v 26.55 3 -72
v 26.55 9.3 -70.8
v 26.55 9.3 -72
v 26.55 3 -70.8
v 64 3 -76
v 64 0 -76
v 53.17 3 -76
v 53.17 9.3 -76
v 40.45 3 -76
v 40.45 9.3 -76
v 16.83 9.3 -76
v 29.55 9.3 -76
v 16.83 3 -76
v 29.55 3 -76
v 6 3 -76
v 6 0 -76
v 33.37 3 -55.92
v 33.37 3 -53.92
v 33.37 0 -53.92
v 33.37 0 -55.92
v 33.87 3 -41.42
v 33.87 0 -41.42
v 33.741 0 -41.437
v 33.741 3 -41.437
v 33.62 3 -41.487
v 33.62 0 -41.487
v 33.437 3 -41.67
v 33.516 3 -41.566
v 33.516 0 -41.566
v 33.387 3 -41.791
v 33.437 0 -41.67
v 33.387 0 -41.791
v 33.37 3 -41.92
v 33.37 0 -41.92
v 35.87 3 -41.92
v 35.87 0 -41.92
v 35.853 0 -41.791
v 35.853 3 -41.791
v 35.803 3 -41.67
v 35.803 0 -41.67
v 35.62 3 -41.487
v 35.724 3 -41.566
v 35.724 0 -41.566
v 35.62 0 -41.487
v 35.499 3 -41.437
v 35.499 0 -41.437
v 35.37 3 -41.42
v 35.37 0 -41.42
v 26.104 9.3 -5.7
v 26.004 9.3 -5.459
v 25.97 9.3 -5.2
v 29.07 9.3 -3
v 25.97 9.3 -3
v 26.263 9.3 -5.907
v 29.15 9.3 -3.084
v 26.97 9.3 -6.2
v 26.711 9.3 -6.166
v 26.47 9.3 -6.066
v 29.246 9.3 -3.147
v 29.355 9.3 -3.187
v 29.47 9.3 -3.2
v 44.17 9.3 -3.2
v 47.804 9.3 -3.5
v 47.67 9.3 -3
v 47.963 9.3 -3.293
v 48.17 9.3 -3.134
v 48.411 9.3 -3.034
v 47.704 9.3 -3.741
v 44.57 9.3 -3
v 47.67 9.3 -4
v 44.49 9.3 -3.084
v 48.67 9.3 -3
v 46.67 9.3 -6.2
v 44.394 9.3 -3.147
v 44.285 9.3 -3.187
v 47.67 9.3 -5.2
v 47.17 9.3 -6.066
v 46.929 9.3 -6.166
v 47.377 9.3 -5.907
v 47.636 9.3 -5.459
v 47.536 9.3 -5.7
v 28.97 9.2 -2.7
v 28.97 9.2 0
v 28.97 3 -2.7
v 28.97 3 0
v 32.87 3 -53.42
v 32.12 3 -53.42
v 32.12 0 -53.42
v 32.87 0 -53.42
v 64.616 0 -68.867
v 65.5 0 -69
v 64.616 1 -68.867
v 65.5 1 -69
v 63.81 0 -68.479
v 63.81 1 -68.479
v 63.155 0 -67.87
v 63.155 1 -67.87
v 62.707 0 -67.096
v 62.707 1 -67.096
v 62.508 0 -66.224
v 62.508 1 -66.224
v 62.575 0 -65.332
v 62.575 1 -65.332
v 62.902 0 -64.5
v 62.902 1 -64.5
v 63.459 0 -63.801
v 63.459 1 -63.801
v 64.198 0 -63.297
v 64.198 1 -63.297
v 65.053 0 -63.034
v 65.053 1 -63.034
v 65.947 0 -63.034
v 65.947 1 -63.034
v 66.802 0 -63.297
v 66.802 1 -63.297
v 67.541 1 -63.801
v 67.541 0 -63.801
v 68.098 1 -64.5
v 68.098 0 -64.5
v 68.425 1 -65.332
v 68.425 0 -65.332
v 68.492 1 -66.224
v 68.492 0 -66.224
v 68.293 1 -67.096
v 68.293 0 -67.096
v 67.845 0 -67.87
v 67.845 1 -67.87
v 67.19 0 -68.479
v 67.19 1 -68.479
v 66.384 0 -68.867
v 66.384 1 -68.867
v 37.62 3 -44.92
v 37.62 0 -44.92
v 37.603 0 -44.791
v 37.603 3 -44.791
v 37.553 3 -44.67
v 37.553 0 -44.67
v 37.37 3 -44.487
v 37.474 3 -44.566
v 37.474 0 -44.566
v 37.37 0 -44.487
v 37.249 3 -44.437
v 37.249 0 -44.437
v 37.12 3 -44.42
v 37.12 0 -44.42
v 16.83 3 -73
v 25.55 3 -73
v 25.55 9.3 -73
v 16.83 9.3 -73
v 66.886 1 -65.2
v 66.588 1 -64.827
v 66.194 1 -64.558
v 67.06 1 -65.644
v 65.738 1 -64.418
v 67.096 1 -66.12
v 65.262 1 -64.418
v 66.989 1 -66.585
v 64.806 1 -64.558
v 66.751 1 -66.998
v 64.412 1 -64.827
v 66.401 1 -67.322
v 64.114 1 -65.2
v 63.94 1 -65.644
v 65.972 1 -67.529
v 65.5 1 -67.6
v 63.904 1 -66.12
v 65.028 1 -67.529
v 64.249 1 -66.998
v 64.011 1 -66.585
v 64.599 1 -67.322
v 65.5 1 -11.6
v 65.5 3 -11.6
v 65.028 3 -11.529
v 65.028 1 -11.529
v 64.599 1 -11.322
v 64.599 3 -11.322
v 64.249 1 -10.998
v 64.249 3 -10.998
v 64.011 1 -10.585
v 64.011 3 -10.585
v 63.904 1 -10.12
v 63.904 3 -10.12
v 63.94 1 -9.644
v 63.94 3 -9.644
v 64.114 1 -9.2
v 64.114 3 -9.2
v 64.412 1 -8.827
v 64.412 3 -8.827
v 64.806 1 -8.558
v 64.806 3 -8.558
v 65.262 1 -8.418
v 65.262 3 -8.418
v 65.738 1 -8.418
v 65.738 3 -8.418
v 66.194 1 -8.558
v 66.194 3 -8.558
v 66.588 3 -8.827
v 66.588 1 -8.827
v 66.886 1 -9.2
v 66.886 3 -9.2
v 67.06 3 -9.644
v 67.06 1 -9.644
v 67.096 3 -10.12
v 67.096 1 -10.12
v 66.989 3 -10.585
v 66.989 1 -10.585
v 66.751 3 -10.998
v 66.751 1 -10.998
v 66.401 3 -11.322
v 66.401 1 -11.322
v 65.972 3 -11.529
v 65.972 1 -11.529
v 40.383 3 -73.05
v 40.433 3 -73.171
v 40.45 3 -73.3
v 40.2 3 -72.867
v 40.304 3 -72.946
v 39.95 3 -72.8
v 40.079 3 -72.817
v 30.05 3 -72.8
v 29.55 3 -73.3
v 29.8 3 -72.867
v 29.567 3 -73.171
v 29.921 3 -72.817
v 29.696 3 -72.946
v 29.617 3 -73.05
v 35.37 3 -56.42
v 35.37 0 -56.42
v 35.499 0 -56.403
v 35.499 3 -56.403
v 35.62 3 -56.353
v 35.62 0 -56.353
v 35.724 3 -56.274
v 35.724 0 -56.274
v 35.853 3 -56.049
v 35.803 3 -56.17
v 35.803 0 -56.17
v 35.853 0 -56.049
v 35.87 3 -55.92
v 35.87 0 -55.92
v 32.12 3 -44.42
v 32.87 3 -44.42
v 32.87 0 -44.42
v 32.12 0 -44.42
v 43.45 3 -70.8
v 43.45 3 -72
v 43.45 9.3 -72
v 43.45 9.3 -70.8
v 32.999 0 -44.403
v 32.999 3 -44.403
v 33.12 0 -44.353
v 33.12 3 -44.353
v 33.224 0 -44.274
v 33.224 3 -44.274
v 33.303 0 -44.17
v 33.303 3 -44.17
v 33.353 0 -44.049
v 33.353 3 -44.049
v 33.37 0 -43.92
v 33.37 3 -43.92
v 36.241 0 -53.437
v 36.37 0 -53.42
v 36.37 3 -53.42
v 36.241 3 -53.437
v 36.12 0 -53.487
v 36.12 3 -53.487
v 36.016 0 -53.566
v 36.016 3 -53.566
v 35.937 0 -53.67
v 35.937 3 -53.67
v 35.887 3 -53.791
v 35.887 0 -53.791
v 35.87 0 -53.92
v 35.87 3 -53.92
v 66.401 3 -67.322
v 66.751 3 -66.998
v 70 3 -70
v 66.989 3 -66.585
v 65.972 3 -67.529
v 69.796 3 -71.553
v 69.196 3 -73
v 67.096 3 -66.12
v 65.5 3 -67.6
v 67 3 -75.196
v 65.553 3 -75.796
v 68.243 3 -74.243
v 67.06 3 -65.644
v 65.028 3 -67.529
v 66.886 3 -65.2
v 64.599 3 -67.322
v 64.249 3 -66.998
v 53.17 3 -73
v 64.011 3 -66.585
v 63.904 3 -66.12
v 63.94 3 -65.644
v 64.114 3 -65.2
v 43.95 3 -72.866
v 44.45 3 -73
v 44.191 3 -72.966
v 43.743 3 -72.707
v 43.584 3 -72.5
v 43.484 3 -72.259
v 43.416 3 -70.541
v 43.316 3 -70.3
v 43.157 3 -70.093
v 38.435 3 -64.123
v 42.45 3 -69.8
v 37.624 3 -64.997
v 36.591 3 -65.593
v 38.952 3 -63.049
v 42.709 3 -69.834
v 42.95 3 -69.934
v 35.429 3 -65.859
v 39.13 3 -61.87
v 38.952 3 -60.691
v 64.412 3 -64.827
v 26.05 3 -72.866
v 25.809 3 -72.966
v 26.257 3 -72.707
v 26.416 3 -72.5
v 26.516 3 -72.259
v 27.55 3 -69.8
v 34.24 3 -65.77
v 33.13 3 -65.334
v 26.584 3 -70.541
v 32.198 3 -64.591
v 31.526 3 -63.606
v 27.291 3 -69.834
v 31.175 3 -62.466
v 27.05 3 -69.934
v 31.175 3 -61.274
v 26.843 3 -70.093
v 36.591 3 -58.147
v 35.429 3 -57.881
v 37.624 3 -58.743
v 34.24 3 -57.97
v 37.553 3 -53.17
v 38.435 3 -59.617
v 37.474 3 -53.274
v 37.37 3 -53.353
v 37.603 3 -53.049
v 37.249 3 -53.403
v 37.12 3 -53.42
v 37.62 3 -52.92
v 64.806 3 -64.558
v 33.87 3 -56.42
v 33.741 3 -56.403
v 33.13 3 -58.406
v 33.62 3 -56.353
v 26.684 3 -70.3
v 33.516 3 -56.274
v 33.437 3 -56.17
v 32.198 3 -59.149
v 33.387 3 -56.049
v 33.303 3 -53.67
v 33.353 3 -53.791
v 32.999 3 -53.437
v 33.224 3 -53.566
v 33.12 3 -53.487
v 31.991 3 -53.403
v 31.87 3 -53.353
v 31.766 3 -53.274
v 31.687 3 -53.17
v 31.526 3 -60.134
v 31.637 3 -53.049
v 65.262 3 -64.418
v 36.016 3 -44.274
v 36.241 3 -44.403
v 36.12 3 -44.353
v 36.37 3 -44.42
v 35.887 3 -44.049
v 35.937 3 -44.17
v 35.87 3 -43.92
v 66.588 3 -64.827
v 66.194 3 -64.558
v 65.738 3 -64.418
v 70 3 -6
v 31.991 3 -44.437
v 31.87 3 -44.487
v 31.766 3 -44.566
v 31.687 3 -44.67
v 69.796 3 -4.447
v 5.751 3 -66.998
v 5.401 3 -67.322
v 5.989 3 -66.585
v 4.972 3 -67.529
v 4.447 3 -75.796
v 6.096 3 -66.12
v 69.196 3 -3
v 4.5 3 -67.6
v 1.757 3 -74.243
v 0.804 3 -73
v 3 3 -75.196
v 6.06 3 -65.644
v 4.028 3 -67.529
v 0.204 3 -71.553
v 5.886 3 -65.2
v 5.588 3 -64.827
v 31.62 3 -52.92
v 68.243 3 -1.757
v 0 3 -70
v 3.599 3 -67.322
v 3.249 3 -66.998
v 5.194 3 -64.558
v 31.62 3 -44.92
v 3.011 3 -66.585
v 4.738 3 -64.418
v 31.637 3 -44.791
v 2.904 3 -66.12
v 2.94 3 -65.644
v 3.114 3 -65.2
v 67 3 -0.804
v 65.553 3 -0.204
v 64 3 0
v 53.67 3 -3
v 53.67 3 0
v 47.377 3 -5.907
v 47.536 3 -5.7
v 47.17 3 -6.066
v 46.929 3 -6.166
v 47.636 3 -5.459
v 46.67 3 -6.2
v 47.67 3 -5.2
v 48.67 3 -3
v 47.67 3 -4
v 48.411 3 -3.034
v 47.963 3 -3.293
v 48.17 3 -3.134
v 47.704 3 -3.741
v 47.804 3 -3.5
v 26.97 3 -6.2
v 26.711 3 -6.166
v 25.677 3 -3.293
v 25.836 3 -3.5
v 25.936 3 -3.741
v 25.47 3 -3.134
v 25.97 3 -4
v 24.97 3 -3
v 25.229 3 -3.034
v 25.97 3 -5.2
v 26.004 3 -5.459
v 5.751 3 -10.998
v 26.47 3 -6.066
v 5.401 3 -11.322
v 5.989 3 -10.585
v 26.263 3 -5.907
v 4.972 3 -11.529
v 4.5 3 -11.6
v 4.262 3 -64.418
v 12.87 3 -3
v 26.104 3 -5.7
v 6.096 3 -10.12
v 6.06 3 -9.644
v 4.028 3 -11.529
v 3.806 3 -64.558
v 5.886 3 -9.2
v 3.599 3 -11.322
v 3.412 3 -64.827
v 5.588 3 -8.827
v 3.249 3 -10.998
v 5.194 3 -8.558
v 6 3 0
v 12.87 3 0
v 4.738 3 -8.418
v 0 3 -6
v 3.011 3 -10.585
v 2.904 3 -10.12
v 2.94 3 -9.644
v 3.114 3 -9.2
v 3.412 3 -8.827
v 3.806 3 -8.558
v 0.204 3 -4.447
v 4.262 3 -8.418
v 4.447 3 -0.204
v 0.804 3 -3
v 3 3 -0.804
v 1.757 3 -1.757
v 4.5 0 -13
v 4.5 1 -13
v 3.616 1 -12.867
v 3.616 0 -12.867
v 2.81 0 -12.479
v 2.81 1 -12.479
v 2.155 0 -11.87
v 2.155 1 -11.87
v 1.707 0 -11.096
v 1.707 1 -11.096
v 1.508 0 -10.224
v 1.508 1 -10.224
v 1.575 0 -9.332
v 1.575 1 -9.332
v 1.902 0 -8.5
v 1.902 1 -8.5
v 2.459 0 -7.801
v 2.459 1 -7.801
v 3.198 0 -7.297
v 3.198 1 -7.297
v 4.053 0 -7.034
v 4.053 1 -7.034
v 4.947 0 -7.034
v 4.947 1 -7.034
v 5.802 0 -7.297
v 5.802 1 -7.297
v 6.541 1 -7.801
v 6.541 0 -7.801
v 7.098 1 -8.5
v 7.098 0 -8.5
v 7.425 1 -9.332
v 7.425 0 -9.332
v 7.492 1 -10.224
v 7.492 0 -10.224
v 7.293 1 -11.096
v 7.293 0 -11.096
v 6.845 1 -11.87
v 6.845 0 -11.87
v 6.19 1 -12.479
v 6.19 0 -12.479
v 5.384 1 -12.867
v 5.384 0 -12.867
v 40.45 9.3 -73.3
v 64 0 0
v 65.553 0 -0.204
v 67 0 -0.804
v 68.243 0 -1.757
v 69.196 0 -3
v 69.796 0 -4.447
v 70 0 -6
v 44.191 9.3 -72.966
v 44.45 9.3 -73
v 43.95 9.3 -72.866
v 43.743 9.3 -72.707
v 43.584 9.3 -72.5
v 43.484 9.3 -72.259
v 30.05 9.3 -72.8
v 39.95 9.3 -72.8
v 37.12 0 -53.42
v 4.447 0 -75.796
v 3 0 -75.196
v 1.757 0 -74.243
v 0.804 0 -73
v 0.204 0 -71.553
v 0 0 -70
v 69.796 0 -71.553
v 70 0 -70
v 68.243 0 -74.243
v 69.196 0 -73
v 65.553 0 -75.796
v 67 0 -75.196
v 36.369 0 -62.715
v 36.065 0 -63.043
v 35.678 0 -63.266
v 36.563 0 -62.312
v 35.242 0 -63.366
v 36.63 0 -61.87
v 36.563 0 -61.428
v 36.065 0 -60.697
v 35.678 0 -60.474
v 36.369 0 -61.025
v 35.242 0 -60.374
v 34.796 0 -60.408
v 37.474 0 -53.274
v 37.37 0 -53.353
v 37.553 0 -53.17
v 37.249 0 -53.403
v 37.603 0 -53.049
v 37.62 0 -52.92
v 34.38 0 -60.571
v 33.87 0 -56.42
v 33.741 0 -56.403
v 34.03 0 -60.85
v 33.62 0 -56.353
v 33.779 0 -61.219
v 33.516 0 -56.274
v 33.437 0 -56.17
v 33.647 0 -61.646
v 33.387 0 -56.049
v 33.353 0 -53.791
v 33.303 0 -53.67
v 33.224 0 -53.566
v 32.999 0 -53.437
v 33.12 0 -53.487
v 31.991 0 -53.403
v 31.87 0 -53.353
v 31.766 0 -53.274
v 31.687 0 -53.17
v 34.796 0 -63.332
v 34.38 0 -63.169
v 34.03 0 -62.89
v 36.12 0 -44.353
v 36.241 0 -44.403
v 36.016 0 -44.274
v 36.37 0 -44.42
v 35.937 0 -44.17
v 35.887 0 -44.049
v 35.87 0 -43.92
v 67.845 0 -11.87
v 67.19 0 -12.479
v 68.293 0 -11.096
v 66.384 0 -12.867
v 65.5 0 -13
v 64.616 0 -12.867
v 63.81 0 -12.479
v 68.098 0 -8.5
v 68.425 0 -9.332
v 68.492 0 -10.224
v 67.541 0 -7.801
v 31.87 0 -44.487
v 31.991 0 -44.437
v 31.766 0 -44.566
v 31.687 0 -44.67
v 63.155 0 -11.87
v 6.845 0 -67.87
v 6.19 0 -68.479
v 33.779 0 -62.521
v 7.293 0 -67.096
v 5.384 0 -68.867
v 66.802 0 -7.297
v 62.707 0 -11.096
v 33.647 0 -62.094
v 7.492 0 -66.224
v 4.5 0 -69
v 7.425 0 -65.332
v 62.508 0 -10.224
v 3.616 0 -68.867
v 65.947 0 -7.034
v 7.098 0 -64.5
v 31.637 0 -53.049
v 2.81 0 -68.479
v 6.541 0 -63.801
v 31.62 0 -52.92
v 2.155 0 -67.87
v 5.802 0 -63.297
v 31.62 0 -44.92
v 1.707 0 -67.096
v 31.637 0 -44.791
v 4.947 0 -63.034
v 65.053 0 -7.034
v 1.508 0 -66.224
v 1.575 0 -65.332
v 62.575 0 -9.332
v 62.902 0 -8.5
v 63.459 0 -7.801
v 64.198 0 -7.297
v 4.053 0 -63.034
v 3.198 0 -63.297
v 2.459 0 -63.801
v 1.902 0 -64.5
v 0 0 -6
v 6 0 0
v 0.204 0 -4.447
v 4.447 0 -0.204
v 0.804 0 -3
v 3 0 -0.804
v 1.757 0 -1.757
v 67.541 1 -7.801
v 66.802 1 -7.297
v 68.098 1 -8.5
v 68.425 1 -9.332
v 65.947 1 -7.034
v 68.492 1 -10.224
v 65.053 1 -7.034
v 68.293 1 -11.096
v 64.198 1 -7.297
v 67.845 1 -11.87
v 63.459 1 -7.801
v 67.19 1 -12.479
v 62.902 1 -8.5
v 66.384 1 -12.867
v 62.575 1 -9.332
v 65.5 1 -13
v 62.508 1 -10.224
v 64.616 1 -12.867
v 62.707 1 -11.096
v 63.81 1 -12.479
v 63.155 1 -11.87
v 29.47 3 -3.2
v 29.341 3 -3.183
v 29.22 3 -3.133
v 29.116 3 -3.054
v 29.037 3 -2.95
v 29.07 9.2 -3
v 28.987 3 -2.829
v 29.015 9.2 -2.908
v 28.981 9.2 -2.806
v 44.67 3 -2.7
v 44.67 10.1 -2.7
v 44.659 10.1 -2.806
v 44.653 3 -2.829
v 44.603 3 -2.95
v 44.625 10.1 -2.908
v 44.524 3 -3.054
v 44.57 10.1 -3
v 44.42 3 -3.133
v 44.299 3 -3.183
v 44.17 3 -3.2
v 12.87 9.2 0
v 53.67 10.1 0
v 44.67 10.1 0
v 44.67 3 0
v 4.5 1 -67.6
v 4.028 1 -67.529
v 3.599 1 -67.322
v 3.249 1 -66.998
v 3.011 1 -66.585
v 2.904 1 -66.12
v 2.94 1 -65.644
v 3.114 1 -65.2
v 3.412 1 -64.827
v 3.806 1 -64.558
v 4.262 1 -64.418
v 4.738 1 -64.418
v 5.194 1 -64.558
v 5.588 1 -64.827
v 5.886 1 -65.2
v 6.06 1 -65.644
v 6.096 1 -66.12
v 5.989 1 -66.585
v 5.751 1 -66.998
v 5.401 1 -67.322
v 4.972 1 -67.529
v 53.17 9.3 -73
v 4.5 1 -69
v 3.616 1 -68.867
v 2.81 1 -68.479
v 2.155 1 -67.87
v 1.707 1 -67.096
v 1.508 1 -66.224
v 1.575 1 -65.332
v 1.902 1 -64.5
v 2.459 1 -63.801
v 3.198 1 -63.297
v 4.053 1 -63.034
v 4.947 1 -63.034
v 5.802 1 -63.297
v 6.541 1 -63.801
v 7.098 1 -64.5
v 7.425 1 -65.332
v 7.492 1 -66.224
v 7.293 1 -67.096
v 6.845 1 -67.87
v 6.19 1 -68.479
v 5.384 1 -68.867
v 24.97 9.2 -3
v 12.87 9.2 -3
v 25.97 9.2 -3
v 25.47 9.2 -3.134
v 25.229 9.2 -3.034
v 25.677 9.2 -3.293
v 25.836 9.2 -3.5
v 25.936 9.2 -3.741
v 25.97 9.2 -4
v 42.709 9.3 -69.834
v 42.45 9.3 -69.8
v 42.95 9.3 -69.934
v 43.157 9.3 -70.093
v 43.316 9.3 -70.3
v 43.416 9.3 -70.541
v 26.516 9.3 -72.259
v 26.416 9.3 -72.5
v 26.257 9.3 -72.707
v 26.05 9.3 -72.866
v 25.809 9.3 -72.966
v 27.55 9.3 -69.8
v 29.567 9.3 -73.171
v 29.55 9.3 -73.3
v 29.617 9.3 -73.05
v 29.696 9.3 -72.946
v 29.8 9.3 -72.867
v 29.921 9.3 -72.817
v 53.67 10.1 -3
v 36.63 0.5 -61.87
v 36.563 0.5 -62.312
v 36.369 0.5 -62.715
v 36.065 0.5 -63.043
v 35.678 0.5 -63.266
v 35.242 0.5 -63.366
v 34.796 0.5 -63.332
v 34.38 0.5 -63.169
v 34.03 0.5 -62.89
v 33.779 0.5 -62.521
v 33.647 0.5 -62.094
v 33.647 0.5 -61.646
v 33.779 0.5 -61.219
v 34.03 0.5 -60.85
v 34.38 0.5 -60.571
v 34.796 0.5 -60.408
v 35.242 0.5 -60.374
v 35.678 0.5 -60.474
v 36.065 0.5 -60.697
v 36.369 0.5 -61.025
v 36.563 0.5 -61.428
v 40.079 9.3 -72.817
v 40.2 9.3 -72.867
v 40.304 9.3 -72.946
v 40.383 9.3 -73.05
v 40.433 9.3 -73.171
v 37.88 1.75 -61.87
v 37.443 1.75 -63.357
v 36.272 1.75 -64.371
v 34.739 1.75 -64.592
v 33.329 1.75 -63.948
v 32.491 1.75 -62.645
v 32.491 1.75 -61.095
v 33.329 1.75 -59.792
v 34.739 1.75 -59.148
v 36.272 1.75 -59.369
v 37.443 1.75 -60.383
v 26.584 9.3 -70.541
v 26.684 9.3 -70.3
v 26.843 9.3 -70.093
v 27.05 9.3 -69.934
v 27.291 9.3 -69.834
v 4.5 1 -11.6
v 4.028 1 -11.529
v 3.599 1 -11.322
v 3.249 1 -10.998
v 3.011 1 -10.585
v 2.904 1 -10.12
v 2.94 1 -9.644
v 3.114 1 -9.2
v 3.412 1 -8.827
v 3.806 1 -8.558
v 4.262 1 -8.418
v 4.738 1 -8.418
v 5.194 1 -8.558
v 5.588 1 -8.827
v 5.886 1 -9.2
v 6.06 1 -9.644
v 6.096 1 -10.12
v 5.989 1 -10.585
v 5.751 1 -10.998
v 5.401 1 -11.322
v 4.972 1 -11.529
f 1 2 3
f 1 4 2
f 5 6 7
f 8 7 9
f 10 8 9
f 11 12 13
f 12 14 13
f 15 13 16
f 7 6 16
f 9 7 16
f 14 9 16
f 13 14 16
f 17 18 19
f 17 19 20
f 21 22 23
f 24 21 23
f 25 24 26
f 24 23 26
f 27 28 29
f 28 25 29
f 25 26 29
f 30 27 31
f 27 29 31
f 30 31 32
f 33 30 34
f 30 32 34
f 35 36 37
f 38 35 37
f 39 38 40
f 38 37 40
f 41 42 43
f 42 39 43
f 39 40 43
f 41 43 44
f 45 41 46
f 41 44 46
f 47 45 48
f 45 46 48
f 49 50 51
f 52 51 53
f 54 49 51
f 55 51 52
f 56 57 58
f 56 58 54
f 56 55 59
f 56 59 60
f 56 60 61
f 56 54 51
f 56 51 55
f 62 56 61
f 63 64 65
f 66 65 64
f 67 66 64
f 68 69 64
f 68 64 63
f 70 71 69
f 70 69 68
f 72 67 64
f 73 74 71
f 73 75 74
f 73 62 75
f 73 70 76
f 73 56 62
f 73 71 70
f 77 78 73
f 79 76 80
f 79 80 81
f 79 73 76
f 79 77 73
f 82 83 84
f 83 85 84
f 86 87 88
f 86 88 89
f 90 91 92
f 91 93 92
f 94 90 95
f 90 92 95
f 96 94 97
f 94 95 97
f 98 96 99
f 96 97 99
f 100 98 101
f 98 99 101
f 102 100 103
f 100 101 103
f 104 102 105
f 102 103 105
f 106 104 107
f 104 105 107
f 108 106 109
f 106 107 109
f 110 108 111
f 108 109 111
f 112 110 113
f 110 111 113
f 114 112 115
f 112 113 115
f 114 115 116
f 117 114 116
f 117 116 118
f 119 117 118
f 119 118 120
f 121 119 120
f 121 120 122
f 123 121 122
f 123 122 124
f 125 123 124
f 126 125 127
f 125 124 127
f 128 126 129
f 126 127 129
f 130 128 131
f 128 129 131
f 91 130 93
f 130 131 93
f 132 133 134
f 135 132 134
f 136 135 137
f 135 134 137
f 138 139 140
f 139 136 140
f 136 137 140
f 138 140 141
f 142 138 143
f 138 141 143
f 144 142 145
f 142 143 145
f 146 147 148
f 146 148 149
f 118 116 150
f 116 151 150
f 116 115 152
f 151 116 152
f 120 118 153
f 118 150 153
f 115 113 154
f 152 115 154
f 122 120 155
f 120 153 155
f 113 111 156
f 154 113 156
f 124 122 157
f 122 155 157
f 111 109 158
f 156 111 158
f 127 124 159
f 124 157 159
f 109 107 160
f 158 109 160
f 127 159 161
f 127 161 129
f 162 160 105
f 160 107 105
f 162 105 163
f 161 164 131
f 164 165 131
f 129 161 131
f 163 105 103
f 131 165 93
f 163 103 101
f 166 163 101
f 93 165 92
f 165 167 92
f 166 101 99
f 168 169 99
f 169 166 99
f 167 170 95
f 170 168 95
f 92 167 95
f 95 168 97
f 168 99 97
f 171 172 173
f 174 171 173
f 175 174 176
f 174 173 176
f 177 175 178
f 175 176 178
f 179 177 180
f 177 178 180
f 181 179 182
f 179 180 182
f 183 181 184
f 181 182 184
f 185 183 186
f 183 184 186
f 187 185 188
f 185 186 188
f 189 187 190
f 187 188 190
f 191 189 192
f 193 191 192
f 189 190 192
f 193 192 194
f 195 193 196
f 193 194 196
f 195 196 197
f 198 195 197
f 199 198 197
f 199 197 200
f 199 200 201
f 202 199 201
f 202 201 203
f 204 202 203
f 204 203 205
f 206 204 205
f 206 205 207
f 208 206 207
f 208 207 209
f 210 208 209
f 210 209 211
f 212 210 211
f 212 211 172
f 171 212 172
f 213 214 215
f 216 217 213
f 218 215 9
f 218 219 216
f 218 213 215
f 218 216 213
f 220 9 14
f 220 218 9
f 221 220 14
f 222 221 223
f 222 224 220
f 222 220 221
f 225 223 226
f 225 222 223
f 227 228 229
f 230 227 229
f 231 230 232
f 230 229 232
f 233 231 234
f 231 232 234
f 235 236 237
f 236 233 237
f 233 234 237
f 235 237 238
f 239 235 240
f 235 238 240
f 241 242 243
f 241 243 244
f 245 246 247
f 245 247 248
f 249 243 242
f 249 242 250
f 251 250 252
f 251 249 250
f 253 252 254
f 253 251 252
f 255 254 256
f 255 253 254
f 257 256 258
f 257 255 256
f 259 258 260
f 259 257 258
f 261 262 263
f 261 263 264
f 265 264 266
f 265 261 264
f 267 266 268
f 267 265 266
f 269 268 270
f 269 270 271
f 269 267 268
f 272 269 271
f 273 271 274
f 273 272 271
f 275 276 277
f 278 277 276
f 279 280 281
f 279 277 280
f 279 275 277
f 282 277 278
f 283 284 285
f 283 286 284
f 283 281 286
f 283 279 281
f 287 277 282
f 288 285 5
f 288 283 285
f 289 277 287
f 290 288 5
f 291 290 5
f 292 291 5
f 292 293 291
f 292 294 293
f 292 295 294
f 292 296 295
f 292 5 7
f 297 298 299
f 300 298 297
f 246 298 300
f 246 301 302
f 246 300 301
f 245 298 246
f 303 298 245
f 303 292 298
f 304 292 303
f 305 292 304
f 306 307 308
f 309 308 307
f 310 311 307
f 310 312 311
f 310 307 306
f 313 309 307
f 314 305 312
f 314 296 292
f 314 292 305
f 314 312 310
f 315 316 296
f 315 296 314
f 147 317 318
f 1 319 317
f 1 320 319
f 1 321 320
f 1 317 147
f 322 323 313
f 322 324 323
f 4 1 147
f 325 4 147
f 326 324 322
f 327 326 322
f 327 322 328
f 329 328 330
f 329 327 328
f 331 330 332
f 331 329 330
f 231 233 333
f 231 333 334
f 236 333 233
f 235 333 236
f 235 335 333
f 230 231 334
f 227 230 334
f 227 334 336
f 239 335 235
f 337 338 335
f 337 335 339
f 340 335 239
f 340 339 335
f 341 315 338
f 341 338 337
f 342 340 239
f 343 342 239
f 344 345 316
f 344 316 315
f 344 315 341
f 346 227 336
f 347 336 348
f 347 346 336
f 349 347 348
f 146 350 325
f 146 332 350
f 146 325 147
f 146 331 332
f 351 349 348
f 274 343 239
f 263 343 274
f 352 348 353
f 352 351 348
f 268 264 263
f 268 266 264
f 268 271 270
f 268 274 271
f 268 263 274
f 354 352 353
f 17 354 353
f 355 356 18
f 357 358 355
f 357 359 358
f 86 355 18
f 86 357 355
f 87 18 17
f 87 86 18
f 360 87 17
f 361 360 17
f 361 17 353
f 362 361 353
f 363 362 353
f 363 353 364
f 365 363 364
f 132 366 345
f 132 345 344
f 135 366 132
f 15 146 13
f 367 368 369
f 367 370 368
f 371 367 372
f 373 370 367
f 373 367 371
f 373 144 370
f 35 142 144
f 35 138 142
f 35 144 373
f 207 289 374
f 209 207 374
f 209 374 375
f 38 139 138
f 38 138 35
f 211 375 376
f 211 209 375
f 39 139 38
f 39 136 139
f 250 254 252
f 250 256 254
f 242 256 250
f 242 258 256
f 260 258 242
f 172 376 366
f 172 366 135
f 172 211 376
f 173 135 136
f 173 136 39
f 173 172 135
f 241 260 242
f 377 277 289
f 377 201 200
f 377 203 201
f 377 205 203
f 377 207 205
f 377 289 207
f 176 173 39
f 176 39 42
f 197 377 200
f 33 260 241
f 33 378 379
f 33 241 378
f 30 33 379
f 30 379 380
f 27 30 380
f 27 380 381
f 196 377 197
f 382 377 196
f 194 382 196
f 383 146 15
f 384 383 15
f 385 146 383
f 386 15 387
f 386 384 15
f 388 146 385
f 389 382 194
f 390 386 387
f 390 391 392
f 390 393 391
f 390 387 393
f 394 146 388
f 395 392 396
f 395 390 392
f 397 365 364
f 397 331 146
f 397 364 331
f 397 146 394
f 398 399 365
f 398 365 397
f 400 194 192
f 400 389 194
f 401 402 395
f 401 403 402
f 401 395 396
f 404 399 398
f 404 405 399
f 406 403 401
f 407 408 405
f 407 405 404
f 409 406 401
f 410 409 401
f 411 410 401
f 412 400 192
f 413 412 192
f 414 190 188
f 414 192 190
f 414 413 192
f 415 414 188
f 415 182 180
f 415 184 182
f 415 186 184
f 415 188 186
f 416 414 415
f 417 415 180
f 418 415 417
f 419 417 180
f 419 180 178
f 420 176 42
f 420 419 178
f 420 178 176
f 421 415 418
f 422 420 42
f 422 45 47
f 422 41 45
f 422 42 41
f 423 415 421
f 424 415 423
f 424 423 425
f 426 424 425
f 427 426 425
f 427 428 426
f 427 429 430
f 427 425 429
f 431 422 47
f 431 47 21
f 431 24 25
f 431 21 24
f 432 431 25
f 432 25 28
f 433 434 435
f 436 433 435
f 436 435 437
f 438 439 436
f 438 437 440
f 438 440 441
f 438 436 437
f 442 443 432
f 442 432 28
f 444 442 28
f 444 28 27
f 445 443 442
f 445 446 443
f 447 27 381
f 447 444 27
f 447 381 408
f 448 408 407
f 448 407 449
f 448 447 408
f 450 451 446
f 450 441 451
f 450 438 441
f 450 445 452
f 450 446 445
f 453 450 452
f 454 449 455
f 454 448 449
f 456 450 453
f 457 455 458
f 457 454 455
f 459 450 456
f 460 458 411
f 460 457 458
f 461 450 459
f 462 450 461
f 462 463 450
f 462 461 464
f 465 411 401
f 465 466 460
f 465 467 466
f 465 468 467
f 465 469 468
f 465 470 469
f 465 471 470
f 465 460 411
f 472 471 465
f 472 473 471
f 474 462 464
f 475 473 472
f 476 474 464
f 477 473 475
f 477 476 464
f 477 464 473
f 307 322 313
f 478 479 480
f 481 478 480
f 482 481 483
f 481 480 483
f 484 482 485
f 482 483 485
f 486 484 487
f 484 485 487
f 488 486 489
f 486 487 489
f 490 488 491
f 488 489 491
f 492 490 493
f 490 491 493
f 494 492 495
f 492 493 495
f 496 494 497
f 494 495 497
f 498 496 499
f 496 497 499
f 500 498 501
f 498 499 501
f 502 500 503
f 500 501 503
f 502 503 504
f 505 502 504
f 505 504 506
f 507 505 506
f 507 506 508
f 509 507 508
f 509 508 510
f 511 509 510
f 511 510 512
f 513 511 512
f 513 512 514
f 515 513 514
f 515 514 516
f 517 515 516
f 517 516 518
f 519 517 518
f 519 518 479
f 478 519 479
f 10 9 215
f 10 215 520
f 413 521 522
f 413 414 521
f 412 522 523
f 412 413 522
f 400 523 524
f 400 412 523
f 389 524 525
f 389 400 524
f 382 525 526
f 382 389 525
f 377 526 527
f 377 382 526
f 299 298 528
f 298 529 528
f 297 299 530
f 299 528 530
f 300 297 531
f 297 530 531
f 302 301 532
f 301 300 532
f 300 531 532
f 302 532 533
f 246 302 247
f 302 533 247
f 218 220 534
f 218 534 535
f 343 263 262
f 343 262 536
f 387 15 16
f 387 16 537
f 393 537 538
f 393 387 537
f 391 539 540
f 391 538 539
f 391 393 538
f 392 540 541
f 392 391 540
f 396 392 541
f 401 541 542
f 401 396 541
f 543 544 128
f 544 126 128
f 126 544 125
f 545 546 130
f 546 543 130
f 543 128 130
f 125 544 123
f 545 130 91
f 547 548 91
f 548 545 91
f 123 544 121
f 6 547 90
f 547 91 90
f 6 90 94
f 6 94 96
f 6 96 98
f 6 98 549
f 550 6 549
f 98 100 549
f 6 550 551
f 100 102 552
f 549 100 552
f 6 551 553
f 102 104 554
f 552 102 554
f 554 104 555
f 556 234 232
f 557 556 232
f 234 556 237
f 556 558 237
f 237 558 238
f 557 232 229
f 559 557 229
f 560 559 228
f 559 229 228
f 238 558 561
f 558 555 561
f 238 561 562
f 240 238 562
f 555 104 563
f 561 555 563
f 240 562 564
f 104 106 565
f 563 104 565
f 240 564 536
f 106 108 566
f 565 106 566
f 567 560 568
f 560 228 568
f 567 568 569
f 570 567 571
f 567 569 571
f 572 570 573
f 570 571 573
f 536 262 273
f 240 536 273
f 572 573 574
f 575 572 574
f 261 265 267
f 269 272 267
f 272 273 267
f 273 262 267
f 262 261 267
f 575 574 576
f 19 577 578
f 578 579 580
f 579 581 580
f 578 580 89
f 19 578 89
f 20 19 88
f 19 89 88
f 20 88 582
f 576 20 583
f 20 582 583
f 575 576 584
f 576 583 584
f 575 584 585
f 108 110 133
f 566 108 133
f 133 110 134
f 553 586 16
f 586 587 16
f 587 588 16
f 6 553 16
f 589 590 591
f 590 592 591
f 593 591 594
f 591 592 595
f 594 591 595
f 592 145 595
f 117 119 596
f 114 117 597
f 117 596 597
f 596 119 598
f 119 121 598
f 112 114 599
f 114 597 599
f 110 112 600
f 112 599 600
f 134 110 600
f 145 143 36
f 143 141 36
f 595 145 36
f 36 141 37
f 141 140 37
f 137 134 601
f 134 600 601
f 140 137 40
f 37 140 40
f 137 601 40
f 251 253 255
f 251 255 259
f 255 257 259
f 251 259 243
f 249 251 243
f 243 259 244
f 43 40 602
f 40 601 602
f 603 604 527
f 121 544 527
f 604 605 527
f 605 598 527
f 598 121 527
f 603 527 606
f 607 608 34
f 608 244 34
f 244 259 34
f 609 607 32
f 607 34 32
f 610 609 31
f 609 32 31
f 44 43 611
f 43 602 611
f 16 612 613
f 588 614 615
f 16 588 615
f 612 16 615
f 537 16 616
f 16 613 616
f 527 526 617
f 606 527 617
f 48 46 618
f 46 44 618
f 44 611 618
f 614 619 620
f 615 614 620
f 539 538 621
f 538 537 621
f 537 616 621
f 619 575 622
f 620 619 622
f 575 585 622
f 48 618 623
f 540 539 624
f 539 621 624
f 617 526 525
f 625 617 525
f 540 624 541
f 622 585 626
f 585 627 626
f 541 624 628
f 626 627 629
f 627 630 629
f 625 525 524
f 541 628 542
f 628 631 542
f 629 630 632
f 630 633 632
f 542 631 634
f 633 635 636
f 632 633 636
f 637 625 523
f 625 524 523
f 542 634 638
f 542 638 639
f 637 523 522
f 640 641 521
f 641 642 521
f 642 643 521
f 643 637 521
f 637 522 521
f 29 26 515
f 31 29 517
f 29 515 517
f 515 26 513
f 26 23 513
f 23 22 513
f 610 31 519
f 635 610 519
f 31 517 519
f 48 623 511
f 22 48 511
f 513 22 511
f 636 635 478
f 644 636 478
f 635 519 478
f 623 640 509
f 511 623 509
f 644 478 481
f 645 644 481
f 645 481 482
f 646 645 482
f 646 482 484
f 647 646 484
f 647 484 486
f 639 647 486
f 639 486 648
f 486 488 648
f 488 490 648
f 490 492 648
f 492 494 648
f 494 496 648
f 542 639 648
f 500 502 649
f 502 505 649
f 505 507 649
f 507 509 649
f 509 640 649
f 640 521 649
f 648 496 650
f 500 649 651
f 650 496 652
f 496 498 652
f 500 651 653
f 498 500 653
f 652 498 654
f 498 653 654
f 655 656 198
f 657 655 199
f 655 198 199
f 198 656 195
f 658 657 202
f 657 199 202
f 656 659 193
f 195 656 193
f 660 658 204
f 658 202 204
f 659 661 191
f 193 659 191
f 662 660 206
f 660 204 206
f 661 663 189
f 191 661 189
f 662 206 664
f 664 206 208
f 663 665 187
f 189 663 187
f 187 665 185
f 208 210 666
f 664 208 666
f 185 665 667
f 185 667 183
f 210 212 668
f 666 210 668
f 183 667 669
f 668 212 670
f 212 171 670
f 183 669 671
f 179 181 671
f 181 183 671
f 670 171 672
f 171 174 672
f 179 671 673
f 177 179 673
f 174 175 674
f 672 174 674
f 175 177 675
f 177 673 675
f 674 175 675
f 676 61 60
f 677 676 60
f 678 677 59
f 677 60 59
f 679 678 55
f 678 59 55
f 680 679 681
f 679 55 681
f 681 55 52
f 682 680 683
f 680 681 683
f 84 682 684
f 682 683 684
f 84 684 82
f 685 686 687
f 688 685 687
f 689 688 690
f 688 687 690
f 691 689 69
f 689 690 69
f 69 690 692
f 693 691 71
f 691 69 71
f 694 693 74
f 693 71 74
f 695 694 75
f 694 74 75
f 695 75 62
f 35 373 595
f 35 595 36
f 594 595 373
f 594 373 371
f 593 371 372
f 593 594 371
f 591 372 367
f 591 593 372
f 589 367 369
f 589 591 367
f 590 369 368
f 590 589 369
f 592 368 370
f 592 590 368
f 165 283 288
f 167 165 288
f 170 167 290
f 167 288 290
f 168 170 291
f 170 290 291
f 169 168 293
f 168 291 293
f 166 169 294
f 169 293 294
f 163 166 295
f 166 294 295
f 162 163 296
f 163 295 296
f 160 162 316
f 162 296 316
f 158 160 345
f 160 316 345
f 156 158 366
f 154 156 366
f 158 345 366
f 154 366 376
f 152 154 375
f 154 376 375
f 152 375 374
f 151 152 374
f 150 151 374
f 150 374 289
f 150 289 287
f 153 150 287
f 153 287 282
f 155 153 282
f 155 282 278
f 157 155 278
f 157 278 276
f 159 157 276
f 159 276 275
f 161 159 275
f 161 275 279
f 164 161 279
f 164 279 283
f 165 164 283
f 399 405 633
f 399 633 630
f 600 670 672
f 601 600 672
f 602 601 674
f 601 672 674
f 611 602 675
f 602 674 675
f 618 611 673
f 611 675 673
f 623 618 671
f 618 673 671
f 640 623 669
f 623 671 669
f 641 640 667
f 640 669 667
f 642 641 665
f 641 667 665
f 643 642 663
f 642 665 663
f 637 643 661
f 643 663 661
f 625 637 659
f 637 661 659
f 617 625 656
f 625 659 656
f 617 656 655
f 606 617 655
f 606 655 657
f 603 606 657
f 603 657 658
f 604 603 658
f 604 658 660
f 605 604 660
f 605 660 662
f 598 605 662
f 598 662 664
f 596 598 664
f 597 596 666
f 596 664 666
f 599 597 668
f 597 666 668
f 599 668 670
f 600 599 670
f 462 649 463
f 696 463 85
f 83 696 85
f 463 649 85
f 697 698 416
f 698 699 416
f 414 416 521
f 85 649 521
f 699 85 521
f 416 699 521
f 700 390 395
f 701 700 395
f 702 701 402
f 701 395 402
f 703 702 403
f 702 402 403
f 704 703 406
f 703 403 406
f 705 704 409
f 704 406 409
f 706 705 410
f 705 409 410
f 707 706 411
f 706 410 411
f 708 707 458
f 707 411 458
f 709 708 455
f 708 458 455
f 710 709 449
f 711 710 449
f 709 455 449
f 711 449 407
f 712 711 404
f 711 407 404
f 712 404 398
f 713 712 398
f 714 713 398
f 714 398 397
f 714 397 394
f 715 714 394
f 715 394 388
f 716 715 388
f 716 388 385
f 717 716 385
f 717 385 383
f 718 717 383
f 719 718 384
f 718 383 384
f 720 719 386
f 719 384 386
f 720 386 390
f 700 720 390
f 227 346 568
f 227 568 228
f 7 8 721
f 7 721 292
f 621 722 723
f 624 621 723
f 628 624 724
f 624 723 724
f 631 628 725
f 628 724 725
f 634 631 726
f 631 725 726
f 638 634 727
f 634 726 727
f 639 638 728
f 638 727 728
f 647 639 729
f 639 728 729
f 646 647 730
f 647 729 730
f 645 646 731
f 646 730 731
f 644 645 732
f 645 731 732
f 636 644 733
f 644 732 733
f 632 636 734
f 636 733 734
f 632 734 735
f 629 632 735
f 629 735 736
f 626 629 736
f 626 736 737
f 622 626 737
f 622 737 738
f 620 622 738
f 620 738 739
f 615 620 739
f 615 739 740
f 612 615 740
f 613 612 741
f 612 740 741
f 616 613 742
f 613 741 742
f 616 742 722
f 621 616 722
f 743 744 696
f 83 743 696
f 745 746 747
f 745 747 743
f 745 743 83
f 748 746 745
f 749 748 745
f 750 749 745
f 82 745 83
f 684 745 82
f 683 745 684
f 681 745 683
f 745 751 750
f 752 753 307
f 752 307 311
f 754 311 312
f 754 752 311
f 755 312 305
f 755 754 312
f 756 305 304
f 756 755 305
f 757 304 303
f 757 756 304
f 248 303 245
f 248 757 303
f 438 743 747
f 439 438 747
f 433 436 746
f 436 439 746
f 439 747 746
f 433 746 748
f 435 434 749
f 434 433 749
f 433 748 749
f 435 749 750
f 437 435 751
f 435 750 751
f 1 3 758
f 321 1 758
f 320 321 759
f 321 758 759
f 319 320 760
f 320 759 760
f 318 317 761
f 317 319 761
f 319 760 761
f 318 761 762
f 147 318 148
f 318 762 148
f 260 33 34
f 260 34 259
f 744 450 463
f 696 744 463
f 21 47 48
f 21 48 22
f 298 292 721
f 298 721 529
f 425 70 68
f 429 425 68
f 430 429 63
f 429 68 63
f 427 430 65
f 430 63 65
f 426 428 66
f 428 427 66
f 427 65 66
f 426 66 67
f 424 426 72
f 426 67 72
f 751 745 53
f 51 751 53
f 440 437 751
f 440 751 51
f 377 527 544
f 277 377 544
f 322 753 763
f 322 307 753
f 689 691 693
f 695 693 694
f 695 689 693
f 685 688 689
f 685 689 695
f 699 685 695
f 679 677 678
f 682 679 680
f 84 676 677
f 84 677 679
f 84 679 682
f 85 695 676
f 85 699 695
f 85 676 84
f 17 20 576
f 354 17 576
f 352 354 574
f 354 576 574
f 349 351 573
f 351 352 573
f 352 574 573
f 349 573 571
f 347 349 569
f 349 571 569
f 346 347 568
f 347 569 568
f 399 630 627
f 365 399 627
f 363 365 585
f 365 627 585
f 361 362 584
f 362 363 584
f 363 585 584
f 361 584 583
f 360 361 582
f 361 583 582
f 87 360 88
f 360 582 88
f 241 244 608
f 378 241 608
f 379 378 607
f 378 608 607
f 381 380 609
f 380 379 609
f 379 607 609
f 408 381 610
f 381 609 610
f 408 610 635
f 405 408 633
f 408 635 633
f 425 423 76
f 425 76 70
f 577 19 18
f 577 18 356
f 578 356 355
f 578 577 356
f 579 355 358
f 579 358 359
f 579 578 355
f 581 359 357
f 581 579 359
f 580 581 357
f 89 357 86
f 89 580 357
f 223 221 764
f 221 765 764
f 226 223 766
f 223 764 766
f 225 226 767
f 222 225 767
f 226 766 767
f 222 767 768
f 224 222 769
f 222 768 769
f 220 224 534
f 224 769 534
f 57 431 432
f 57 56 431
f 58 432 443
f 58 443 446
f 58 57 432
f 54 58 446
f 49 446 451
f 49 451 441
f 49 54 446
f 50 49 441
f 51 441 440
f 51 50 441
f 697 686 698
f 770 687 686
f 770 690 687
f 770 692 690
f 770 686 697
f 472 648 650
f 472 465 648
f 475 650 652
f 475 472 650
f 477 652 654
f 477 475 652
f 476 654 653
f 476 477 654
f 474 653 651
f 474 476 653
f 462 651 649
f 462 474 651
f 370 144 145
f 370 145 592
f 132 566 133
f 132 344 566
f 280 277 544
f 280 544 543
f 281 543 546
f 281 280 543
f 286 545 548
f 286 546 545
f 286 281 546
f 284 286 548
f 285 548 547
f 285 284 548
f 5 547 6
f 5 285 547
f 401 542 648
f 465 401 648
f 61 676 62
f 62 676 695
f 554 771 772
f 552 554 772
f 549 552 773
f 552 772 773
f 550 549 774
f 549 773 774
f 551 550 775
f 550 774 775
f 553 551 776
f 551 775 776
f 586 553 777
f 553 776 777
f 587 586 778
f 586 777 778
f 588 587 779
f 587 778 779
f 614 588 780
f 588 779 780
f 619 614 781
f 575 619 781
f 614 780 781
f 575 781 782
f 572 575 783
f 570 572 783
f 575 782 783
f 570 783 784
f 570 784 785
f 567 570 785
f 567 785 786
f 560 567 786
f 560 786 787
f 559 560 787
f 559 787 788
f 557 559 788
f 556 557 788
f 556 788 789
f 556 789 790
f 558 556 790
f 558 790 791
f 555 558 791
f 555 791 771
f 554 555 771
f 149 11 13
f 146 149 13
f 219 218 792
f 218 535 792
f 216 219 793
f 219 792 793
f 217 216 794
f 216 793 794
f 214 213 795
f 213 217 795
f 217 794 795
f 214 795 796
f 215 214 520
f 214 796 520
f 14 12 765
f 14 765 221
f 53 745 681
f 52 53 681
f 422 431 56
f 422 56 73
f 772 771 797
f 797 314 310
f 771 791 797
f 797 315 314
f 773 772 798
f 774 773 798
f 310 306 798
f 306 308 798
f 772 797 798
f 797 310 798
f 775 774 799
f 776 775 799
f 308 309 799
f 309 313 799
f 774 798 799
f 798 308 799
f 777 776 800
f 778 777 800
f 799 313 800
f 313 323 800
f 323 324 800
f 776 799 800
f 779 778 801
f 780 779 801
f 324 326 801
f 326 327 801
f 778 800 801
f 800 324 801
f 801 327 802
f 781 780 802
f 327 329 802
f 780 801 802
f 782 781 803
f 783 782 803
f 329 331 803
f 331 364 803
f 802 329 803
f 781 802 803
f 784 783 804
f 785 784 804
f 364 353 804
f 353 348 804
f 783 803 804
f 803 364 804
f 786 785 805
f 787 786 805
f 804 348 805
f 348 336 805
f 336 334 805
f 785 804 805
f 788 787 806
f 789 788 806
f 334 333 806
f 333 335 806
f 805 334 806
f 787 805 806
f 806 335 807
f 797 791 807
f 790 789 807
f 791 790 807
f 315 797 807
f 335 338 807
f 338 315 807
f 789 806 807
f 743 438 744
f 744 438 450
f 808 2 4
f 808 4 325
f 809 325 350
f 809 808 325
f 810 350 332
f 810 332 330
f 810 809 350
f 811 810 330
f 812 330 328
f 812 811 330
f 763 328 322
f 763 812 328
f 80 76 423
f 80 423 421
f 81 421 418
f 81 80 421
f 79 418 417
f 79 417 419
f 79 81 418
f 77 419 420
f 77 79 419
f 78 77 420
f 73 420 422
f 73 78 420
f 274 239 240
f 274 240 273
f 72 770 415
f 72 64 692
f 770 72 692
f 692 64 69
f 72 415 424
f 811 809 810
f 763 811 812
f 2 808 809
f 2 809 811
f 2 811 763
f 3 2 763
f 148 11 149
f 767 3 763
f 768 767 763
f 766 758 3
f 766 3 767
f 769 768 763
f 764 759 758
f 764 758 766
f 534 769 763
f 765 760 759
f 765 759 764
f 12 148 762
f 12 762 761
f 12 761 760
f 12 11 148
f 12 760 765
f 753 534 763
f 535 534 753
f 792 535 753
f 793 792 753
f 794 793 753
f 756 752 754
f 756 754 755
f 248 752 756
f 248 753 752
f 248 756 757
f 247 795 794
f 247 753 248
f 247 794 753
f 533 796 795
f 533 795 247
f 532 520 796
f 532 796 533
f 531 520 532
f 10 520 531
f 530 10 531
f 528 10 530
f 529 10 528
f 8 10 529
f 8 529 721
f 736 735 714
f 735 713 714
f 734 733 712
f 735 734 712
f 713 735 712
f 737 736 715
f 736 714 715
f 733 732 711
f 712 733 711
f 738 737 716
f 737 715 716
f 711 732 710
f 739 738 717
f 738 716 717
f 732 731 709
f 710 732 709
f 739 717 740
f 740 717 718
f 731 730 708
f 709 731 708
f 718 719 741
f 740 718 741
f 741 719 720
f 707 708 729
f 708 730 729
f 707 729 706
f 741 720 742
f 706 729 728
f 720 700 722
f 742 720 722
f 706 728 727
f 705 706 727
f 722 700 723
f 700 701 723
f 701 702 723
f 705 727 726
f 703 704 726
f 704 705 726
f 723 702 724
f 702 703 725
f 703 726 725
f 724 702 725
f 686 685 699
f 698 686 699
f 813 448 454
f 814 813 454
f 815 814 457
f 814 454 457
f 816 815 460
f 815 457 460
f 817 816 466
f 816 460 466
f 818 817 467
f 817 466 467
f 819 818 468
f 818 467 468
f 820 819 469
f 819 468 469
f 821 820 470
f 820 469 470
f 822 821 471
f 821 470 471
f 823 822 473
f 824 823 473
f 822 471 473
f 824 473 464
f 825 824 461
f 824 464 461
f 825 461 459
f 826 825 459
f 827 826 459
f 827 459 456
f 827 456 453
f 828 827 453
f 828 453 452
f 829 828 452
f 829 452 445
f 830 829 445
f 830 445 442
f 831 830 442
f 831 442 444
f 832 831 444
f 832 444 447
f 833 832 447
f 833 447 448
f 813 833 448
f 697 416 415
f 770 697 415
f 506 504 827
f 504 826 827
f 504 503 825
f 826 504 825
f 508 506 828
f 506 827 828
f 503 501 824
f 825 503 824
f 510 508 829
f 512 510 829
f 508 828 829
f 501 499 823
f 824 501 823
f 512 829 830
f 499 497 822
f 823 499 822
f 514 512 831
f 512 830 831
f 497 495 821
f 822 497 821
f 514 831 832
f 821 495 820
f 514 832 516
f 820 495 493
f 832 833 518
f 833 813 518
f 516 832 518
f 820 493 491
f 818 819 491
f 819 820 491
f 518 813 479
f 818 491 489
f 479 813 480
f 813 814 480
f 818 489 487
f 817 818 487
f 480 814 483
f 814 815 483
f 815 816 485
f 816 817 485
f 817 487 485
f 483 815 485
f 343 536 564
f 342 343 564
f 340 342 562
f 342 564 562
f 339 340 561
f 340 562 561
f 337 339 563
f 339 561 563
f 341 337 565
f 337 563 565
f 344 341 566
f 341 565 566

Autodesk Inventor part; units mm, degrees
ref_plane "YZ Plane" through (0, 0, 0) normal (1, 0, 0) x (0, 1, 0)
ref_plane "XZ Plane" through (0, 0, 0) normal (0, 1, 0) x (-1, 0, 0)
ref_plane "XY Plane" through (0, 0, 0) normal (0, 0, 1) x (1, 0, 0)
sketch "Sketch1" plane through (0, 0, 0) normal (0, 1, 0) x (-1, 0, 0)
  line L0 (0, 0) -> (-70, 0)
  line L1 (-70, 0) -> (-70, -76)
  line L2 (-70, -76) -> (0, -76)
  line L3 (0, -76) -> (0, 0)
  dimension "d0" = 70
  dimension "d1" = 76
extrude "Extrusion1" add sketch "Sketch1" along normal blind 3
sketch "Sketch2" plane through (0, 3, 0) normal (0, 1, 0) x (1, 0, 0)
  line L0 (70, 76) -> (0, 76) projected
  line L1 (16.33, 76) -> (30.05, 76)
  line L2 (30.05, 76) -> (30.05, 73)
  line L3 (30.05, 73) -> (16.33, 73)
  line L4 (16.33, 73) -> (16.33, 76)
  line L5 (39.95, 76) -> (53.67, 76)
  line L6 (53.67, 76) -> (53.67, 73)
  line L7 (53.67, 73) -> (39.95, 73)
  line L8 (39.95, 73) -> (39.95, 76)
  line L9 (30.05, 74.5) -> (39.95, 74.5) construction
  line L10 (0, 76) -> (0, 0) projected
  point P0 (23.19, 73)
  point P1 (46.81, 73)
  point P2 (35, 74.5)
  point P3 (35, 76)
  dimension "d4" = 13.72
  dimension "d5" = 13.72
  dimension "d6" = 3
  dimension "d29" = 16.33
extrude "Extrusion2" add sketch "Sketch2" along normal blind 6.3
sketch "Sketch3" plane through (0, 3, 0) normal (0, 1, 0) x (1, 0, 0)
  line L0 (0, 0) -> (70, 0) projected
  line L1 (44.67, 0) -> (53.67, 0)
  line L2 (53.67, 0) -> (53.67, 3)
  line L3 (53.67, 3) -> (44.67, 3)
  line L4 (44.67, 3) -> (44.67, 0)
  line L5 (53.67, 76) -> (53.67, 73) projected
  dimension "d10" = 9
  dimension "d11" = 3
extrude "Extrusion3" add sketch "Sketch3" along normal blind 7.1
sketch "Sketch4" plane through (0, 3, 0) normal (0, 1, 0) x (1, 0, 0)
  line L0 (16.33, 73) -> (16.33, 76) projected
  line L1 (0, 0) -> (44.67, 0) projected
  line L2 (44.67, 0) -> (44.67, 3) projected
  line L3 (12.87, 0) -> (28.97, 0)
  line L4 (28.97, 0) -> (28.97, 3)
  line L5 (28.97, 3) -> (12.87, 3)
  line L6 (12.87, 3) -> (12.87, 0)
  dimension "d16" = 16.1
  dimension "d17" = 15.7
extrude "Extrusion4" add sketch "Sketch4" along normal blind 6.2
sketch "Sketch5" plane through (0, 0, 0) normal (0, -1, 0) x (1, 0, 0)
  line L0 (0, 0) -> (70, 0) projected
  line L1 (0, -76) -> (0, 0) projected
  line L2 (4.5, -10) -> (65.5, -10) construction
  line L3 (65.5, -10) -> (65.5, -66) construction
  line L4 (65.5, -66) -> (4.5, -66) construction
  line L5 (4.5, -66) -> (4.5, -10) construction
  point P0 (35, -10)
  point P1 (35, 0)
  point P2 (4.5, -38)
  point P3 (0, -38)
  dimension "d20" = 10
  dimension "d21" = 4.5
hole "Hole1" at (4.5, 0, -10) at (4.5, 0, -66) at (65.5, 0, -66) at (65.5, 0, -10) direction (0, 1, 0) diameter 3.2 end through all counterbore diameter 6 counterbore depth 1
fillet "Fillet1" radius 6 4 edges at (0, 1.5, 0) (70, 1.5, 0) (70, 1.5, -76) (0, 1.5, -76)
sketch "Sketch6" plane through (0, 3, 0) normal (0, 1, 0) x (1, 0, 0)
  line L0 (16.33, 76) -> (6, 76) projected
  line L1 (13.03, 69.24) -> (56.97, 69.24) construction
  line L2 (0, 70) -> (70, 70) construction
  line L3 (13.03, 69.24) -> (13.03, 6.76) construction
  line L4 (6, 76) -> (6, 0) construction
  line L5 (37.62, 53.42) -> (37.62, 44.42)
  line L6 (31.62, 44.42) -> (31.62, 53.42)
  line L7 (33.37, 56.42) -> (35.87, 56.42)
  line L8 (35.87, 41.42) -> (33.37, 41.42)
  line L9 (31.62, 53.42) -> (33.37, 53.42)
  line L10 (35.87, 53.42) -> (37.62, 53.42)
  line L11 (37.62, 44.42) -> (35.87, 44.42)
  line L12 (33.37, 44.42) -> (31.62, 44.42)
  line L13 (33.37, 41.42) -> (33.37, 44.42)
  line L14 (33.37, 53.42) -> (33.37, 56.42)
  line L15 (35.87, 56.42) -> (35.87, 53.42)
  line L16 (35.87, 44.42) -> (35.87, 41.42)
  circle A0 centre (35.13, 61.87) radius 1.5
  point P0 (0, 0)
  point P1 (35, 69.24)
  point P2 (35, 70)
  point P3 (6, 38)
  point P4 (13.03, 38)
  point P5 (34.62, 56.42)
  point P6 (31.62, 48.92)
  dimension "d31" = 43.94
  dimension "d32" = 62.48
  dimension "d33" = 6
  dimension "d34" = 9
  dimension "d35" = 2.5
  dimension "d36" = 15
  dimension "d38" = 20.32
  dimension "d39" = 3
  dimension "d40" = 7.37
  dimension "d44" = 21.84
  dimension "d45" = 22.35
extrude "Extrusion5" cut sketch "Sketch6" against normal through all
fillet "Fillet2" radius 0.5 12 edges at (35.87, 1.5, -53.42) (33.37, 1.5, -53.42) (35.87, 1.5, -56.42) (33.37, 1.5, -56.42) (37.62, 1.5, -53.42) (37.62, 1.5, -44.42) (35.87, 1.5, -44.42) (35.87, 1.5, -41.42) (33.37, 1.5, -41.42) (33.37, 1.5, -44.42) (31.62, 1.5, -44.42) (31.62, 1.5, -53.42)
chamfer "Chamfer1" distance 2.5 angle 45 1 edges at (33.63, 3, -61.87)
sketch "Sketch7" plane through (30.05, 9.3, -76) normal (0, 0, -1) x (-1, 0, 0)
  line L0 (-9.9, -6.3) -> (-9.9, 0) projected
  line L1 (-23.62, 0) -> (-9.9, 0) projected
  line L2 (-33.95, -6.3) -> (-23.62, -6.3) projected
  line L3 (-23.62, 0) -> (-23.12, 0)
  line L4 (-23.12, 0) -> (-23.12, -6.3)
  line L5 (-23.12, -6.3) -> (-23.62, -6.3)
  line L6 (-23.62, -6.3) -> (-23.62, 0)
  line L7 (-10.4, 0) -> (-9.9, 0)
  line L8 (-9.9, 0) -> (-9.9, -6.3)
  line L9 (-9.9, -6.3) -> (-10.4, -6.3)
  line L10 (-10.4, -6.3) -> (-10.4, 0)
  line L11 (0, 0) -> (0.5, 0)
  line L12 (0.5, 0) -> (0.5, -6.3)
  line L13 (0.5, -6.3) -> (0, -6.3)
  line L14 (0, -6.3) -> (0, 0)
  line L15 (13.72, 0) -> (13.22, 0)
  line L16 (13.22, 0) -> (13.22, -6.3)
  line L17 (13.22, -6.3) -> (13.72, -6.3)
  line L18 (13.72, -6.3) -> (13.72, 0)
  point P0 (30.05, -9.3)
  dimension "d50" = 0.5
extrude "Extrusion6" cut sketch "Sketch7" against normal up to surface (3 mm away)
sketch "Sketch8" plane through (0, 3, 0) normal (0, 1, 0) x (1, 0, 0)
  line L0 (12.87, 3) -> (28.97, 3) projected
  line L1 (44.67, 0) -> (44.67, 3) projected
  line L2 (44.67, 3) -> (53.67, 3) projected
  line L3 (53.17, 73) -> (40.45, 73) projected
  line L4 (29.55, 73) -> (16.83, 73) projected
  line L5 (33.37, 41.92) -> (33.37, 43.92) projected
  line L6 (28.97, 3) -> (28.97, 3.2)
  line L7 (28.97, 3.2) -> (44.67, 3.2)
  line L8 (44.67, 3.2) -> (44.67, 3)
  line L9 (28.97, 3) -> (25.97, 3)
  line L10 (25.97, 3) -> (25.97, 6.2)
  line L11 (25.97, 6.2) -> (47.67, 6.2)
  line L12 (47.67, 6.2) -> (47.67, 3)
  line L13 (47.67, 3) -> (44.67, 3)
  line L14 (29.55, 73) -> (29.55, 72.8)
  line L15 (29.55, 72.8) -> (40.45, 72.8)
  line L16 (40.45, 72.8) -> (40.45, 73)
  line L17 (40.45, 73) -> (43.45, 73)
  line L18 (43.45, 73) -> (43.45, 69.8)
  line L19 (43.45, 69.8) -> (26.55, 69.8)
  line L20 (26.55, 69.8) -> (26.55, 73)
  line L21 (26.55, 73) -> (29.55, 73)
  point P0 (0, 0)
  dimension "d53" = 0.2
  dimension "d54" = 3
  dimension "d55" = 3
  dimension "d56" = 3
  dimension "d57" = 3
  dimension "d58" = 3
  dimension "d59" = 3
extrude "Extrusion7" add sketch "Sketch8" along normal up to surface (6.3 mm away)
fillet "Fillet3" radius 0.5 4 edges at (29.55, 6.15, -72.8) (40.45, 6.15, -72.8) (44.67, 6.15, -3.2) (28.97, 6.15, -3.2)
fillet "Fillet4" radius 1 8 edges at (43.45, 6.15, -73) (43.45, 6.15, -69.8) (26.55, 6.15, -73) (26.55, 6.15, -69.8) (47.67, 6.15, -3) (47.67, 6.15, -6.2) (25.97, 6.1, -3) (25.97, 6.15, -6.2)
equation "\"d5\" = d4"
equation "\"d55\" = d54"
equation "\"d56\" = d55"
equation "\"d57\" = d54"
equation "\"d58\" = d57"
equation "\"d59\" = d57"
properties part number "top"
